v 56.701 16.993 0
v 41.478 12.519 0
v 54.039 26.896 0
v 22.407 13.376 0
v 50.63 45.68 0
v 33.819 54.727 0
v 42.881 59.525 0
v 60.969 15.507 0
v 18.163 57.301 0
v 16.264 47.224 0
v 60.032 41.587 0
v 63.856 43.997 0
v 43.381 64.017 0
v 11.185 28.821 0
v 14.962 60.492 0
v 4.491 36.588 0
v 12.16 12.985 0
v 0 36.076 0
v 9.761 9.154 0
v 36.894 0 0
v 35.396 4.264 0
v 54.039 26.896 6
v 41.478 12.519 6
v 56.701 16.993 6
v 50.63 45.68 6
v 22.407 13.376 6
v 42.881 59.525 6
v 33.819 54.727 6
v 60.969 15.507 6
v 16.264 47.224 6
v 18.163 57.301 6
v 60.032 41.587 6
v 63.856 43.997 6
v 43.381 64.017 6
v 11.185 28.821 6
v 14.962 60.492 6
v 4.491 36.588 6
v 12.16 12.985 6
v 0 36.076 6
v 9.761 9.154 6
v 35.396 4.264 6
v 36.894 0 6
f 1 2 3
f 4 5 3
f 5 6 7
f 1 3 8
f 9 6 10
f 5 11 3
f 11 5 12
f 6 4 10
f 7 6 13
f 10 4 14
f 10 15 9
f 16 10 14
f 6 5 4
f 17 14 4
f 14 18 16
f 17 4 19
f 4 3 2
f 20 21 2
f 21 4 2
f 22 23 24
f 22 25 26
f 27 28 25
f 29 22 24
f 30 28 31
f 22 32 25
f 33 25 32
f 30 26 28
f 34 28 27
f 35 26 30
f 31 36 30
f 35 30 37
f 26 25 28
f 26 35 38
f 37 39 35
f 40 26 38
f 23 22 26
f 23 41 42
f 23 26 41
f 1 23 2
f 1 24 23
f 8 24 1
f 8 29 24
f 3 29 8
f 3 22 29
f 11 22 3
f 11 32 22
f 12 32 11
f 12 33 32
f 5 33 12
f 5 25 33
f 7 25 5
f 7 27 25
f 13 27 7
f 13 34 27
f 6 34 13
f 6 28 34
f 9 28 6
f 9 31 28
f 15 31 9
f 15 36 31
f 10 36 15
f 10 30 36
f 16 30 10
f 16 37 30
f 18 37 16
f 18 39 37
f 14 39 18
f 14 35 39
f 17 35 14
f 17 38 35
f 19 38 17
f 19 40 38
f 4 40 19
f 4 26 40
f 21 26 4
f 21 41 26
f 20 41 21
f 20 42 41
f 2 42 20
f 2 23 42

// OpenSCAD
$fn = 32;

// ----------------------------------------------------------------------
// Fan rotor section: 7 blades, 22 mm hub radius, 11 mm blades
// ----------------------------------------------------------------------

// --- parameters (mm) ---
profile_height = 6;       // extrusion height
profile_points = 21;      // points of the closed outline

profile = [[54.039, 26.896], [60.032, 41.587], [63.856, 43.997], [50.63, 45.68], [42.881, 59.525], [43.381, 64.017], [33.819, 54.727], [18.163, 57.301], [14.962, 60.492], [16.264, 47.224], [4.491, 36.588], [0, 36.076], [11.185, 28.821], [12.16, 12.985], [9.761, 9.154], [22.407, 13.376], [35.396, 4.264], [36.894, 0], [41.478, 12.519], [56.701, 16.993], [60.969, 15.507]];  // single closed polygon, 21 points, counter clockwise

// --- the one profile operation ---
linear_extrude(height = profile_height) polygon(points = profile);
